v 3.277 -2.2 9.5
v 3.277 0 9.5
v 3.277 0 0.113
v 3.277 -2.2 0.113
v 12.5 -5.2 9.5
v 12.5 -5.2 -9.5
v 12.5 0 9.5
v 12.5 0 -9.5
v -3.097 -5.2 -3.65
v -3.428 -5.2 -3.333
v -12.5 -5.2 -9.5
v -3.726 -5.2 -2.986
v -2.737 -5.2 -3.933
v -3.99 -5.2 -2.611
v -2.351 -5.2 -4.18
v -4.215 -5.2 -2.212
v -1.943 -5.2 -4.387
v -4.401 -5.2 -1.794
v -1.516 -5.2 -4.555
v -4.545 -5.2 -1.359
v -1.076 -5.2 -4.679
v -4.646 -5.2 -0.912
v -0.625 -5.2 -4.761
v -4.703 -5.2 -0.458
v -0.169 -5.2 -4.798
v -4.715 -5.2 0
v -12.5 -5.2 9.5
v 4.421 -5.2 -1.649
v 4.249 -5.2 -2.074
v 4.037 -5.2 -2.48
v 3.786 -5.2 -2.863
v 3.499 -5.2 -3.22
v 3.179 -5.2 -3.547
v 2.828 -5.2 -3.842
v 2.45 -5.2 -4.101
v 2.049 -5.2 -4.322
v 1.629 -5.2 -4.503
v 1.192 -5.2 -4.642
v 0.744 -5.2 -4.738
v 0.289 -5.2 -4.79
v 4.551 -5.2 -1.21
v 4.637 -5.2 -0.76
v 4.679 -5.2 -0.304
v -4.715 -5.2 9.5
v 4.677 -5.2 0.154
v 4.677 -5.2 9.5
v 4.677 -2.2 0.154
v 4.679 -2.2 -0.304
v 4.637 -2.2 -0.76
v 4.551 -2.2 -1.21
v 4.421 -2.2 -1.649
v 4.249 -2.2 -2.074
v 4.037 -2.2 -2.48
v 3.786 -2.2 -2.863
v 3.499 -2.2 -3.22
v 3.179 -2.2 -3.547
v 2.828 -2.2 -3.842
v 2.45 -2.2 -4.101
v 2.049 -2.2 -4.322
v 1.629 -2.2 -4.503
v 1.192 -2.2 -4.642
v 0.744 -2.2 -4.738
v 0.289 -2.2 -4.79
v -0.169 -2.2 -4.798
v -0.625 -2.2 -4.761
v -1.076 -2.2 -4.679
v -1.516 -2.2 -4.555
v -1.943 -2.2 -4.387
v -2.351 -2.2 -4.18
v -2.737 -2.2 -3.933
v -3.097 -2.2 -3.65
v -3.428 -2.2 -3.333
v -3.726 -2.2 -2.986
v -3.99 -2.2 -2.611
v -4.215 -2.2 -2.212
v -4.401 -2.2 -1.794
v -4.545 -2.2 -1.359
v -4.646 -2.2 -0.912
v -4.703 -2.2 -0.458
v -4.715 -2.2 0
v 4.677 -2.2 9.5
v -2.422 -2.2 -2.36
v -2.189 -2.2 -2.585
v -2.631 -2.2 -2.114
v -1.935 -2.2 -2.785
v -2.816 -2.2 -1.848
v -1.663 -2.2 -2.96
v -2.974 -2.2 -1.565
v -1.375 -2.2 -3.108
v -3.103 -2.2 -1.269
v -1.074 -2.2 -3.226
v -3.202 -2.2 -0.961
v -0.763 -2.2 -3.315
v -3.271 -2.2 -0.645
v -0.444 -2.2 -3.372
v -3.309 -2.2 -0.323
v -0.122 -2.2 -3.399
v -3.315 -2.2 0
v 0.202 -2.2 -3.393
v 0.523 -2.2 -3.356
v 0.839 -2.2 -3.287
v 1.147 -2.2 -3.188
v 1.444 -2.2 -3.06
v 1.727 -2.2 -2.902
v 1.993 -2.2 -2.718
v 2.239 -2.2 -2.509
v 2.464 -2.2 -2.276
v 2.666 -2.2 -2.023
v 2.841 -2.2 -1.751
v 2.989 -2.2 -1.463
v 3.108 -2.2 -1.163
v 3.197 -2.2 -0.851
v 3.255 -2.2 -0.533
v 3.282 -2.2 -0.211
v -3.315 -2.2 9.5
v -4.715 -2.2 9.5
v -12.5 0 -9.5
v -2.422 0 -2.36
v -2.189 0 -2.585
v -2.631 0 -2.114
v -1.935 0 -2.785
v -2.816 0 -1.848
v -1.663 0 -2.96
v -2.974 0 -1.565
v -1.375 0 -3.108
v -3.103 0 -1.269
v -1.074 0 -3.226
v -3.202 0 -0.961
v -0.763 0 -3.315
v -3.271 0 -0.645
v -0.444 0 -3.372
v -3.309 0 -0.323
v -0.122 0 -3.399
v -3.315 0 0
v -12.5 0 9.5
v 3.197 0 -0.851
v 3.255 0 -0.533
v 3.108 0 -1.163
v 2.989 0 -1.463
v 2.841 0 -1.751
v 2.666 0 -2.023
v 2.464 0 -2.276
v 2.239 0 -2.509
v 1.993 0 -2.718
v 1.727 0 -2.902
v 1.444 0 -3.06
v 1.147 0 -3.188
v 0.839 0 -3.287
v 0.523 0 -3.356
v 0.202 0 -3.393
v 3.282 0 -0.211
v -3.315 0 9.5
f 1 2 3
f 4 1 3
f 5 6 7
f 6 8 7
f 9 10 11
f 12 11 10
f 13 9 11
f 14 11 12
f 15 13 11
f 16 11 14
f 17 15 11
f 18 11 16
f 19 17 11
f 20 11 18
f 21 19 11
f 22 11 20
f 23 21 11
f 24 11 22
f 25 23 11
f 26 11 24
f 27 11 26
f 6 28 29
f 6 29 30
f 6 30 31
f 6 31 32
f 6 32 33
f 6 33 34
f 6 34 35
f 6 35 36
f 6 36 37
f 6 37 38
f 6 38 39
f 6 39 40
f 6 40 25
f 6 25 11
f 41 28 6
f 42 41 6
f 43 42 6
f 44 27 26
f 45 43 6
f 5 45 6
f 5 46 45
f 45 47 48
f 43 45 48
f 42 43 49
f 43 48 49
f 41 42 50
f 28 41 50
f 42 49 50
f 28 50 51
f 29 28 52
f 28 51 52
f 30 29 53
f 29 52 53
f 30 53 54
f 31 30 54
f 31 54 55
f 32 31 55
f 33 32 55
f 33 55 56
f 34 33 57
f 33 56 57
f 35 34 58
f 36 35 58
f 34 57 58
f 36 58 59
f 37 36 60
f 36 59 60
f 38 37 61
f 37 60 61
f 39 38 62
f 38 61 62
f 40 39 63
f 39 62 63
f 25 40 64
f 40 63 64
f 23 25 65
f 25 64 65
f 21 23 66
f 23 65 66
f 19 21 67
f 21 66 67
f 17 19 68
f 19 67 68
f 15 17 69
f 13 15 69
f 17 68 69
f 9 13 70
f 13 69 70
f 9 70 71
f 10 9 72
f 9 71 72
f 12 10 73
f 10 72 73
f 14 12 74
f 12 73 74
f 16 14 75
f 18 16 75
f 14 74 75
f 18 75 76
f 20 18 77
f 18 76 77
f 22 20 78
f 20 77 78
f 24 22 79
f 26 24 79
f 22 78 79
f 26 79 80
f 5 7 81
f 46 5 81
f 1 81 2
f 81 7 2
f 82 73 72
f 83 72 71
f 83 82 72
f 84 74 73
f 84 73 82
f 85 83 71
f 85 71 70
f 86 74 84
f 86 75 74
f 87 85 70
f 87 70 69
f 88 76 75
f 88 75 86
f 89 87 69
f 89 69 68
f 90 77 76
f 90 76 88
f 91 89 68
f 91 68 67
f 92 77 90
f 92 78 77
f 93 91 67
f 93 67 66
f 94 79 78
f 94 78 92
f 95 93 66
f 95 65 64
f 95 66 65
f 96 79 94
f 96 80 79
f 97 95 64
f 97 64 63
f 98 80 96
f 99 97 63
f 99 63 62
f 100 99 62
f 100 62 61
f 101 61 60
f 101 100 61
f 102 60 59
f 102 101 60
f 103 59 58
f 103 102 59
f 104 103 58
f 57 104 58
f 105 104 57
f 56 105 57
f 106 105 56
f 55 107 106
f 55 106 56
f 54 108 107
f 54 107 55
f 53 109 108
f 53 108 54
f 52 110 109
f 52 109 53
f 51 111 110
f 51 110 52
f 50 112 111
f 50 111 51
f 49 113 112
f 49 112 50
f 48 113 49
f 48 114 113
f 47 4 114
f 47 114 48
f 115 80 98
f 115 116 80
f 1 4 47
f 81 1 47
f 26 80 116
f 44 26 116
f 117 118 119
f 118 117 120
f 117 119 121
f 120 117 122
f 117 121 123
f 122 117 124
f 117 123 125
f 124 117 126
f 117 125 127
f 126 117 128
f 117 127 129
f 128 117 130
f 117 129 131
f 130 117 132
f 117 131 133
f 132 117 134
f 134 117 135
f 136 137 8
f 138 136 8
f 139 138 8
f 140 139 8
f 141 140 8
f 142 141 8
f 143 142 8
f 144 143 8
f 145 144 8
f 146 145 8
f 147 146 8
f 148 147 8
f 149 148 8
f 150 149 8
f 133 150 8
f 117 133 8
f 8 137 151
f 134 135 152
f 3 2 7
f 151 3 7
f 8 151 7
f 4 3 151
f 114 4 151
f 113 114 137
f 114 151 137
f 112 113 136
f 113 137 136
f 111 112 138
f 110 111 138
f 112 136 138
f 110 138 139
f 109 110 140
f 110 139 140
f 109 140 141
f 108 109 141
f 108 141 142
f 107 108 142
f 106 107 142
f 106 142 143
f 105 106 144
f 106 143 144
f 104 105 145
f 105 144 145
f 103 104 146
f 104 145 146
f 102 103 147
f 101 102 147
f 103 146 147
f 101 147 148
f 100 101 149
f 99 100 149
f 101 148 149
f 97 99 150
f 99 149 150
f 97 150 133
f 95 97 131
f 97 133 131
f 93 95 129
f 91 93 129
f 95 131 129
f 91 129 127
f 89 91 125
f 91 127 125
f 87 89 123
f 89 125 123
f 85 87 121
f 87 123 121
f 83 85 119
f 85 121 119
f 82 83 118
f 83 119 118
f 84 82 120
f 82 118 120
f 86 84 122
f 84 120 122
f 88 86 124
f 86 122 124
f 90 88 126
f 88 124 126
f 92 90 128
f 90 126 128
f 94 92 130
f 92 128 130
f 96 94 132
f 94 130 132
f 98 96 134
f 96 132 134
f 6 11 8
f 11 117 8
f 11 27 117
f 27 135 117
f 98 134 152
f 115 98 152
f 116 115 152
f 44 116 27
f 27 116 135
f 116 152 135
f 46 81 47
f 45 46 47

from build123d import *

# Parameters (mm, degrees)
F1_DEPTH = 2.2
F3_DEPTH = 3


with BuildPart() as f1:
    # F0 (on Front) → F1 (new body)
    with BuildSketch(Plane.XZ):
        with BuildLine():
            Line((12.5, -9.5), (12.5, 9.5))
            Line((12.5, 9.5), (3.2765988609, 9.5))
            Line((3.2765988609, 9.5), (3.2765988609, 0.1127291822))
            ThreePointArc((3.2765988609, 0.1127291822), (0.0399120355, -3.3998448003), (-3.3149907831, 0))
            Line((-3.3149907831, 0), (-3.3149907831, 9.5))
            Line((-3.3149907831, 9.5), (-12.5, 9.5))
            Line((-12.5, 9.5), (-12.5, -9.5))
            Line((-12.5, -9.5), (12.5, -9.5))
        make_face()
    extrude(amount=F1_DEPTH)

    # F2 (on face) → F3 (join)
    with BuildSketch(Plane.XZ.offset(2.2)):
        with BuildLine():
            ThreePointArc((4.6765988609, 0.1539773139), (0.0605272986, -4.799695782), (-4.7154452944, 0))
            Line((-4.7154452944, 0), (-4.7154452944, 9.5))
            Line((-4.7154452944, 9.5), (-12.5, 9.5))
            Line((-12.5, 9.5), (-12.5, -9.5))
            Line((-12.5, -9.5), (12.5, -9.5))
            Line((12.5, -9.5), (12.5, 9.5))
            Line((12.5, 9.5), (4.6765988609, 9.5))
            Line((4.6765988609, 9.5), (4.6765988609, 0.1539773139))
        make_face()
    extrude(amount=F3_DEPTH)


solid = f1.part
